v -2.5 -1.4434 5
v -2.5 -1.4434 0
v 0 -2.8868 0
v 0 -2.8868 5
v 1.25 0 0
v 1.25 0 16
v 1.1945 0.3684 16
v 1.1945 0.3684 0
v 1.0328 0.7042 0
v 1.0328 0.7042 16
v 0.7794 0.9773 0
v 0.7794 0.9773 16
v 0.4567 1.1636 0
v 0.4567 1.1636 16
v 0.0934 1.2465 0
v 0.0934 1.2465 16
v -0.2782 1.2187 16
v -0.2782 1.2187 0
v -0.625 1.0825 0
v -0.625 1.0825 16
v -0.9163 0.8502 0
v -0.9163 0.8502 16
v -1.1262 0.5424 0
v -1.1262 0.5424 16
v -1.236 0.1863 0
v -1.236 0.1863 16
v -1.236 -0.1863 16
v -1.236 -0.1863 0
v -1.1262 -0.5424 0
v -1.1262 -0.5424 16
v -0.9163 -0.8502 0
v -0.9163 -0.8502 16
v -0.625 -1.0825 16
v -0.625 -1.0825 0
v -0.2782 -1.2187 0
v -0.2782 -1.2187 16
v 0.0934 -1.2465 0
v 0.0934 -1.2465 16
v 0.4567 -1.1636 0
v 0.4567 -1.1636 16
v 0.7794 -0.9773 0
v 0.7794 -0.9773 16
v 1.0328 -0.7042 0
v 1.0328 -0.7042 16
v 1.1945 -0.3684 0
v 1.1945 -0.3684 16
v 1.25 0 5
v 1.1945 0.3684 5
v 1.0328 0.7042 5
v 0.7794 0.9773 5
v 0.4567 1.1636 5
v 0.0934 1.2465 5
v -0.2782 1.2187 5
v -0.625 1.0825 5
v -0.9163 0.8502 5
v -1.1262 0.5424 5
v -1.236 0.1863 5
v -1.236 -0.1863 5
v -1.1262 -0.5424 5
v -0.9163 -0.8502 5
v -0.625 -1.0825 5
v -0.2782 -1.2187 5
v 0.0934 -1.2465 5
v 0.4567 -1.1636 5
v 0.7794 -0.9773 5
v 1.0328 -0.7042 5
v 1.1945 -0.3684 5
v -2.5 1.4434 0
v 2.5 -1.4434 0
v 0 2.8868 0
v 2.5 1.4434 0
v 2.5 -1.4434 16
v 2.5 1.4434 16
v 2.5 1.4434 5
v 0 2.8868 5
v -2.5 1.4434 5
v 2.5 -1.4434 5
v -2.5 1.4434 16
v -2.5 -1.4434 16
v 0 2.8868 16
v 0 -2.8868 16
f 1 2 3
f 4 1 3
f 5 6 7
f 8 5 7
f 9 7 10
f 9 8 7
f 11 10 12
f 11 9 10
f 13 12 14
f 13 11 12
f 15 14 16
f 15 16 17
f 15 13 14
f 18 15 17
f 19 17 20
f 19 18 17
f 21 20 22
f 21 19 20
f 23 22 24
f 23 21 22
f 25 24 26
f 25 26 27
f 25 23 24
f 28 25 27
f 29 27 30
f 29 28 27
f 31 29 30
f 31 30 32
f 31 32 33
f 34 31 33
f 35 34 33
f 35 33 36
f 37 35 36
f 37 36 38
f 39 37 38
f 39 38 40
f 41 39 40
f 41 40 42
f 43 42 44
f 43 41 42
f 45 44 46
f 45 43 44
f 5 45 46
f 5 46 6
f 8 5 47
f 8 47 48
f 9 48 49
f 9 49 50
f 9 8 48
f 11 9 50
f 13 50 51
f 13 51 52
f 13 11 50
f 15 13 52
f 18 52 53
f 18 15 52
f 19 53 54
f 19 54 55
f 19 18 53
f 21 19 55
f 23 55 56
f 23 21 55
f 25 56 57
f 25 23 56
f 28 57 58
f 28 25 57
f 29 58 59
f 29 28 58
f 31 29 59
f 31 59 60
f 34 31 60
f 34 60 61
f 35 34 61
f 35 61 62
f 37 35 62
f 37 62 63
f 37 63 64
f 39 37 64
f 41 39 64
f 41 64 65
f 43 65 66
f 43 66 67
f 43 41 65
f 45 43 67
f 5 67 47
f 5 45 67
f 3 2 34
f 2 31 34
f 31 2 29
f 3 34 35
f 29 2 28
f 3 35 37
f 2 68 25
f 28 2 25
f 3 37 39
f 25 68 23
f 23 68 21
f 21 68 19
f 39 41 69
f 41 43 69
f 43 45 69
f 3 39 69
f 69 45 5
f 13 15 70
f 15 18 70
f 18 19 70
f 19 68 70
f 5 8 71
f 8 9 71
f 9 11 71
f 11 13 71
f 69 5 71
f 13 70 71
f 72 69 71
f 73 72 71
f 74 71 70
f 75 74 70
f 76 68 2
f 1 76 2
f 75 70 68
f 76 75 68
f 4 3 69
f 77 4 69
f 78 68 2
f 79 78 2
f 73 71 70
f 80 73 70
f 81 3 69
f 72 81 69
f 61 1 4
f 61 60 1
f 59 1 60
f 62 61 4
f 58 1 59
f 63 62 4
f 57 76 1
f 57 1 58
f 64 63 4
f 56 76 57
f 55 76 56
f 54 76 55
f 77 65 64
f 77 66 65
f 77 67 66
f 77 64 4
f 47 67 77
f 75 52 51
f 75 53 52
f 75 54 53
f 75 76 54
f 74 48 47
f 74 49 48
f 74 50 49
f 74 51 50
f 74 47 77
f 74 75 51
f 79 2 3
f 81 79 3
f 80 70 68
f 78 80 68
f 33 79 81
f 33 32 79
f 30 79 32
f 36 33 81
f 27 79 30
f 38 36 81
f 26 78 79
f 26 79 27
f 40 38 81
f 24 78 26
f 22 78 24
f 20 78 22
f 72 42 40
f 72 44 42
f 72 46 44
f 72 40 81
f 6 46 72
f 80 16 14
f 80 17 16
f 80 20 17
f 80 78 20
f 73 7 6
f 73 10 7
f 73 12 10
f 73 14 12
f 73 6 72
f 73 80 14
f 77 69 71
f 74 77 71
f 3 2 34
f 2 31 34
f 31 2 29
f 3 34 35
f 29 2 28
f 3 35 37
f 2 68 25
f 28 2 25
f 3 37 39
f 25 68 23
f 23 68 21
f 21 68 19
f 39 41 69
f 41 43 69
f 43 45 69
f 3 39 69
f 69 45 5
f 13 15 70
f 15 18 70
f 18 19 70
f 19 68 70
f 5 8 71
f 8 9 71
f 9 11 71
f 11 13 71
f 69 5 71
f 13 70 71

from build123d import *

# Parameters (mm, degrees)
F0_R     = 1.25
F1_DEPTH = 5
F2_DEPTH = 16


with BuildPart() as f1:
    # F0 (on Top) → F1 (new body)
    with BuildSketch(Plane.XY):
        Polygon((-2.5, 1.443376), (-2.5, -1.443376), (0, -2.886751), (2.5, -1.443376), (2.5, 1.443376), (0, 2.886751), align=None)
        Circle(F0_R, mode=Mode.SUBTRACT)
    extrude(amount=F1_DEPTH)


with BuildPart() as f2:
    # F0 (on Top) → F2 (new body)
    with BuildSketch(Plane.XY):
        Polygon((-2.5, 1.443376), (-2.5, -1.443376), (0, -2.886751), (2.5, -1.443376), (2.5, 1.443376), (0, 2.886751), align=None)
        Circle(F0_R, mode=Mode.SUBTRACT)
    extrude(amount=F2_DEPTH)


solid = Compound([f1.part, f2.part])
